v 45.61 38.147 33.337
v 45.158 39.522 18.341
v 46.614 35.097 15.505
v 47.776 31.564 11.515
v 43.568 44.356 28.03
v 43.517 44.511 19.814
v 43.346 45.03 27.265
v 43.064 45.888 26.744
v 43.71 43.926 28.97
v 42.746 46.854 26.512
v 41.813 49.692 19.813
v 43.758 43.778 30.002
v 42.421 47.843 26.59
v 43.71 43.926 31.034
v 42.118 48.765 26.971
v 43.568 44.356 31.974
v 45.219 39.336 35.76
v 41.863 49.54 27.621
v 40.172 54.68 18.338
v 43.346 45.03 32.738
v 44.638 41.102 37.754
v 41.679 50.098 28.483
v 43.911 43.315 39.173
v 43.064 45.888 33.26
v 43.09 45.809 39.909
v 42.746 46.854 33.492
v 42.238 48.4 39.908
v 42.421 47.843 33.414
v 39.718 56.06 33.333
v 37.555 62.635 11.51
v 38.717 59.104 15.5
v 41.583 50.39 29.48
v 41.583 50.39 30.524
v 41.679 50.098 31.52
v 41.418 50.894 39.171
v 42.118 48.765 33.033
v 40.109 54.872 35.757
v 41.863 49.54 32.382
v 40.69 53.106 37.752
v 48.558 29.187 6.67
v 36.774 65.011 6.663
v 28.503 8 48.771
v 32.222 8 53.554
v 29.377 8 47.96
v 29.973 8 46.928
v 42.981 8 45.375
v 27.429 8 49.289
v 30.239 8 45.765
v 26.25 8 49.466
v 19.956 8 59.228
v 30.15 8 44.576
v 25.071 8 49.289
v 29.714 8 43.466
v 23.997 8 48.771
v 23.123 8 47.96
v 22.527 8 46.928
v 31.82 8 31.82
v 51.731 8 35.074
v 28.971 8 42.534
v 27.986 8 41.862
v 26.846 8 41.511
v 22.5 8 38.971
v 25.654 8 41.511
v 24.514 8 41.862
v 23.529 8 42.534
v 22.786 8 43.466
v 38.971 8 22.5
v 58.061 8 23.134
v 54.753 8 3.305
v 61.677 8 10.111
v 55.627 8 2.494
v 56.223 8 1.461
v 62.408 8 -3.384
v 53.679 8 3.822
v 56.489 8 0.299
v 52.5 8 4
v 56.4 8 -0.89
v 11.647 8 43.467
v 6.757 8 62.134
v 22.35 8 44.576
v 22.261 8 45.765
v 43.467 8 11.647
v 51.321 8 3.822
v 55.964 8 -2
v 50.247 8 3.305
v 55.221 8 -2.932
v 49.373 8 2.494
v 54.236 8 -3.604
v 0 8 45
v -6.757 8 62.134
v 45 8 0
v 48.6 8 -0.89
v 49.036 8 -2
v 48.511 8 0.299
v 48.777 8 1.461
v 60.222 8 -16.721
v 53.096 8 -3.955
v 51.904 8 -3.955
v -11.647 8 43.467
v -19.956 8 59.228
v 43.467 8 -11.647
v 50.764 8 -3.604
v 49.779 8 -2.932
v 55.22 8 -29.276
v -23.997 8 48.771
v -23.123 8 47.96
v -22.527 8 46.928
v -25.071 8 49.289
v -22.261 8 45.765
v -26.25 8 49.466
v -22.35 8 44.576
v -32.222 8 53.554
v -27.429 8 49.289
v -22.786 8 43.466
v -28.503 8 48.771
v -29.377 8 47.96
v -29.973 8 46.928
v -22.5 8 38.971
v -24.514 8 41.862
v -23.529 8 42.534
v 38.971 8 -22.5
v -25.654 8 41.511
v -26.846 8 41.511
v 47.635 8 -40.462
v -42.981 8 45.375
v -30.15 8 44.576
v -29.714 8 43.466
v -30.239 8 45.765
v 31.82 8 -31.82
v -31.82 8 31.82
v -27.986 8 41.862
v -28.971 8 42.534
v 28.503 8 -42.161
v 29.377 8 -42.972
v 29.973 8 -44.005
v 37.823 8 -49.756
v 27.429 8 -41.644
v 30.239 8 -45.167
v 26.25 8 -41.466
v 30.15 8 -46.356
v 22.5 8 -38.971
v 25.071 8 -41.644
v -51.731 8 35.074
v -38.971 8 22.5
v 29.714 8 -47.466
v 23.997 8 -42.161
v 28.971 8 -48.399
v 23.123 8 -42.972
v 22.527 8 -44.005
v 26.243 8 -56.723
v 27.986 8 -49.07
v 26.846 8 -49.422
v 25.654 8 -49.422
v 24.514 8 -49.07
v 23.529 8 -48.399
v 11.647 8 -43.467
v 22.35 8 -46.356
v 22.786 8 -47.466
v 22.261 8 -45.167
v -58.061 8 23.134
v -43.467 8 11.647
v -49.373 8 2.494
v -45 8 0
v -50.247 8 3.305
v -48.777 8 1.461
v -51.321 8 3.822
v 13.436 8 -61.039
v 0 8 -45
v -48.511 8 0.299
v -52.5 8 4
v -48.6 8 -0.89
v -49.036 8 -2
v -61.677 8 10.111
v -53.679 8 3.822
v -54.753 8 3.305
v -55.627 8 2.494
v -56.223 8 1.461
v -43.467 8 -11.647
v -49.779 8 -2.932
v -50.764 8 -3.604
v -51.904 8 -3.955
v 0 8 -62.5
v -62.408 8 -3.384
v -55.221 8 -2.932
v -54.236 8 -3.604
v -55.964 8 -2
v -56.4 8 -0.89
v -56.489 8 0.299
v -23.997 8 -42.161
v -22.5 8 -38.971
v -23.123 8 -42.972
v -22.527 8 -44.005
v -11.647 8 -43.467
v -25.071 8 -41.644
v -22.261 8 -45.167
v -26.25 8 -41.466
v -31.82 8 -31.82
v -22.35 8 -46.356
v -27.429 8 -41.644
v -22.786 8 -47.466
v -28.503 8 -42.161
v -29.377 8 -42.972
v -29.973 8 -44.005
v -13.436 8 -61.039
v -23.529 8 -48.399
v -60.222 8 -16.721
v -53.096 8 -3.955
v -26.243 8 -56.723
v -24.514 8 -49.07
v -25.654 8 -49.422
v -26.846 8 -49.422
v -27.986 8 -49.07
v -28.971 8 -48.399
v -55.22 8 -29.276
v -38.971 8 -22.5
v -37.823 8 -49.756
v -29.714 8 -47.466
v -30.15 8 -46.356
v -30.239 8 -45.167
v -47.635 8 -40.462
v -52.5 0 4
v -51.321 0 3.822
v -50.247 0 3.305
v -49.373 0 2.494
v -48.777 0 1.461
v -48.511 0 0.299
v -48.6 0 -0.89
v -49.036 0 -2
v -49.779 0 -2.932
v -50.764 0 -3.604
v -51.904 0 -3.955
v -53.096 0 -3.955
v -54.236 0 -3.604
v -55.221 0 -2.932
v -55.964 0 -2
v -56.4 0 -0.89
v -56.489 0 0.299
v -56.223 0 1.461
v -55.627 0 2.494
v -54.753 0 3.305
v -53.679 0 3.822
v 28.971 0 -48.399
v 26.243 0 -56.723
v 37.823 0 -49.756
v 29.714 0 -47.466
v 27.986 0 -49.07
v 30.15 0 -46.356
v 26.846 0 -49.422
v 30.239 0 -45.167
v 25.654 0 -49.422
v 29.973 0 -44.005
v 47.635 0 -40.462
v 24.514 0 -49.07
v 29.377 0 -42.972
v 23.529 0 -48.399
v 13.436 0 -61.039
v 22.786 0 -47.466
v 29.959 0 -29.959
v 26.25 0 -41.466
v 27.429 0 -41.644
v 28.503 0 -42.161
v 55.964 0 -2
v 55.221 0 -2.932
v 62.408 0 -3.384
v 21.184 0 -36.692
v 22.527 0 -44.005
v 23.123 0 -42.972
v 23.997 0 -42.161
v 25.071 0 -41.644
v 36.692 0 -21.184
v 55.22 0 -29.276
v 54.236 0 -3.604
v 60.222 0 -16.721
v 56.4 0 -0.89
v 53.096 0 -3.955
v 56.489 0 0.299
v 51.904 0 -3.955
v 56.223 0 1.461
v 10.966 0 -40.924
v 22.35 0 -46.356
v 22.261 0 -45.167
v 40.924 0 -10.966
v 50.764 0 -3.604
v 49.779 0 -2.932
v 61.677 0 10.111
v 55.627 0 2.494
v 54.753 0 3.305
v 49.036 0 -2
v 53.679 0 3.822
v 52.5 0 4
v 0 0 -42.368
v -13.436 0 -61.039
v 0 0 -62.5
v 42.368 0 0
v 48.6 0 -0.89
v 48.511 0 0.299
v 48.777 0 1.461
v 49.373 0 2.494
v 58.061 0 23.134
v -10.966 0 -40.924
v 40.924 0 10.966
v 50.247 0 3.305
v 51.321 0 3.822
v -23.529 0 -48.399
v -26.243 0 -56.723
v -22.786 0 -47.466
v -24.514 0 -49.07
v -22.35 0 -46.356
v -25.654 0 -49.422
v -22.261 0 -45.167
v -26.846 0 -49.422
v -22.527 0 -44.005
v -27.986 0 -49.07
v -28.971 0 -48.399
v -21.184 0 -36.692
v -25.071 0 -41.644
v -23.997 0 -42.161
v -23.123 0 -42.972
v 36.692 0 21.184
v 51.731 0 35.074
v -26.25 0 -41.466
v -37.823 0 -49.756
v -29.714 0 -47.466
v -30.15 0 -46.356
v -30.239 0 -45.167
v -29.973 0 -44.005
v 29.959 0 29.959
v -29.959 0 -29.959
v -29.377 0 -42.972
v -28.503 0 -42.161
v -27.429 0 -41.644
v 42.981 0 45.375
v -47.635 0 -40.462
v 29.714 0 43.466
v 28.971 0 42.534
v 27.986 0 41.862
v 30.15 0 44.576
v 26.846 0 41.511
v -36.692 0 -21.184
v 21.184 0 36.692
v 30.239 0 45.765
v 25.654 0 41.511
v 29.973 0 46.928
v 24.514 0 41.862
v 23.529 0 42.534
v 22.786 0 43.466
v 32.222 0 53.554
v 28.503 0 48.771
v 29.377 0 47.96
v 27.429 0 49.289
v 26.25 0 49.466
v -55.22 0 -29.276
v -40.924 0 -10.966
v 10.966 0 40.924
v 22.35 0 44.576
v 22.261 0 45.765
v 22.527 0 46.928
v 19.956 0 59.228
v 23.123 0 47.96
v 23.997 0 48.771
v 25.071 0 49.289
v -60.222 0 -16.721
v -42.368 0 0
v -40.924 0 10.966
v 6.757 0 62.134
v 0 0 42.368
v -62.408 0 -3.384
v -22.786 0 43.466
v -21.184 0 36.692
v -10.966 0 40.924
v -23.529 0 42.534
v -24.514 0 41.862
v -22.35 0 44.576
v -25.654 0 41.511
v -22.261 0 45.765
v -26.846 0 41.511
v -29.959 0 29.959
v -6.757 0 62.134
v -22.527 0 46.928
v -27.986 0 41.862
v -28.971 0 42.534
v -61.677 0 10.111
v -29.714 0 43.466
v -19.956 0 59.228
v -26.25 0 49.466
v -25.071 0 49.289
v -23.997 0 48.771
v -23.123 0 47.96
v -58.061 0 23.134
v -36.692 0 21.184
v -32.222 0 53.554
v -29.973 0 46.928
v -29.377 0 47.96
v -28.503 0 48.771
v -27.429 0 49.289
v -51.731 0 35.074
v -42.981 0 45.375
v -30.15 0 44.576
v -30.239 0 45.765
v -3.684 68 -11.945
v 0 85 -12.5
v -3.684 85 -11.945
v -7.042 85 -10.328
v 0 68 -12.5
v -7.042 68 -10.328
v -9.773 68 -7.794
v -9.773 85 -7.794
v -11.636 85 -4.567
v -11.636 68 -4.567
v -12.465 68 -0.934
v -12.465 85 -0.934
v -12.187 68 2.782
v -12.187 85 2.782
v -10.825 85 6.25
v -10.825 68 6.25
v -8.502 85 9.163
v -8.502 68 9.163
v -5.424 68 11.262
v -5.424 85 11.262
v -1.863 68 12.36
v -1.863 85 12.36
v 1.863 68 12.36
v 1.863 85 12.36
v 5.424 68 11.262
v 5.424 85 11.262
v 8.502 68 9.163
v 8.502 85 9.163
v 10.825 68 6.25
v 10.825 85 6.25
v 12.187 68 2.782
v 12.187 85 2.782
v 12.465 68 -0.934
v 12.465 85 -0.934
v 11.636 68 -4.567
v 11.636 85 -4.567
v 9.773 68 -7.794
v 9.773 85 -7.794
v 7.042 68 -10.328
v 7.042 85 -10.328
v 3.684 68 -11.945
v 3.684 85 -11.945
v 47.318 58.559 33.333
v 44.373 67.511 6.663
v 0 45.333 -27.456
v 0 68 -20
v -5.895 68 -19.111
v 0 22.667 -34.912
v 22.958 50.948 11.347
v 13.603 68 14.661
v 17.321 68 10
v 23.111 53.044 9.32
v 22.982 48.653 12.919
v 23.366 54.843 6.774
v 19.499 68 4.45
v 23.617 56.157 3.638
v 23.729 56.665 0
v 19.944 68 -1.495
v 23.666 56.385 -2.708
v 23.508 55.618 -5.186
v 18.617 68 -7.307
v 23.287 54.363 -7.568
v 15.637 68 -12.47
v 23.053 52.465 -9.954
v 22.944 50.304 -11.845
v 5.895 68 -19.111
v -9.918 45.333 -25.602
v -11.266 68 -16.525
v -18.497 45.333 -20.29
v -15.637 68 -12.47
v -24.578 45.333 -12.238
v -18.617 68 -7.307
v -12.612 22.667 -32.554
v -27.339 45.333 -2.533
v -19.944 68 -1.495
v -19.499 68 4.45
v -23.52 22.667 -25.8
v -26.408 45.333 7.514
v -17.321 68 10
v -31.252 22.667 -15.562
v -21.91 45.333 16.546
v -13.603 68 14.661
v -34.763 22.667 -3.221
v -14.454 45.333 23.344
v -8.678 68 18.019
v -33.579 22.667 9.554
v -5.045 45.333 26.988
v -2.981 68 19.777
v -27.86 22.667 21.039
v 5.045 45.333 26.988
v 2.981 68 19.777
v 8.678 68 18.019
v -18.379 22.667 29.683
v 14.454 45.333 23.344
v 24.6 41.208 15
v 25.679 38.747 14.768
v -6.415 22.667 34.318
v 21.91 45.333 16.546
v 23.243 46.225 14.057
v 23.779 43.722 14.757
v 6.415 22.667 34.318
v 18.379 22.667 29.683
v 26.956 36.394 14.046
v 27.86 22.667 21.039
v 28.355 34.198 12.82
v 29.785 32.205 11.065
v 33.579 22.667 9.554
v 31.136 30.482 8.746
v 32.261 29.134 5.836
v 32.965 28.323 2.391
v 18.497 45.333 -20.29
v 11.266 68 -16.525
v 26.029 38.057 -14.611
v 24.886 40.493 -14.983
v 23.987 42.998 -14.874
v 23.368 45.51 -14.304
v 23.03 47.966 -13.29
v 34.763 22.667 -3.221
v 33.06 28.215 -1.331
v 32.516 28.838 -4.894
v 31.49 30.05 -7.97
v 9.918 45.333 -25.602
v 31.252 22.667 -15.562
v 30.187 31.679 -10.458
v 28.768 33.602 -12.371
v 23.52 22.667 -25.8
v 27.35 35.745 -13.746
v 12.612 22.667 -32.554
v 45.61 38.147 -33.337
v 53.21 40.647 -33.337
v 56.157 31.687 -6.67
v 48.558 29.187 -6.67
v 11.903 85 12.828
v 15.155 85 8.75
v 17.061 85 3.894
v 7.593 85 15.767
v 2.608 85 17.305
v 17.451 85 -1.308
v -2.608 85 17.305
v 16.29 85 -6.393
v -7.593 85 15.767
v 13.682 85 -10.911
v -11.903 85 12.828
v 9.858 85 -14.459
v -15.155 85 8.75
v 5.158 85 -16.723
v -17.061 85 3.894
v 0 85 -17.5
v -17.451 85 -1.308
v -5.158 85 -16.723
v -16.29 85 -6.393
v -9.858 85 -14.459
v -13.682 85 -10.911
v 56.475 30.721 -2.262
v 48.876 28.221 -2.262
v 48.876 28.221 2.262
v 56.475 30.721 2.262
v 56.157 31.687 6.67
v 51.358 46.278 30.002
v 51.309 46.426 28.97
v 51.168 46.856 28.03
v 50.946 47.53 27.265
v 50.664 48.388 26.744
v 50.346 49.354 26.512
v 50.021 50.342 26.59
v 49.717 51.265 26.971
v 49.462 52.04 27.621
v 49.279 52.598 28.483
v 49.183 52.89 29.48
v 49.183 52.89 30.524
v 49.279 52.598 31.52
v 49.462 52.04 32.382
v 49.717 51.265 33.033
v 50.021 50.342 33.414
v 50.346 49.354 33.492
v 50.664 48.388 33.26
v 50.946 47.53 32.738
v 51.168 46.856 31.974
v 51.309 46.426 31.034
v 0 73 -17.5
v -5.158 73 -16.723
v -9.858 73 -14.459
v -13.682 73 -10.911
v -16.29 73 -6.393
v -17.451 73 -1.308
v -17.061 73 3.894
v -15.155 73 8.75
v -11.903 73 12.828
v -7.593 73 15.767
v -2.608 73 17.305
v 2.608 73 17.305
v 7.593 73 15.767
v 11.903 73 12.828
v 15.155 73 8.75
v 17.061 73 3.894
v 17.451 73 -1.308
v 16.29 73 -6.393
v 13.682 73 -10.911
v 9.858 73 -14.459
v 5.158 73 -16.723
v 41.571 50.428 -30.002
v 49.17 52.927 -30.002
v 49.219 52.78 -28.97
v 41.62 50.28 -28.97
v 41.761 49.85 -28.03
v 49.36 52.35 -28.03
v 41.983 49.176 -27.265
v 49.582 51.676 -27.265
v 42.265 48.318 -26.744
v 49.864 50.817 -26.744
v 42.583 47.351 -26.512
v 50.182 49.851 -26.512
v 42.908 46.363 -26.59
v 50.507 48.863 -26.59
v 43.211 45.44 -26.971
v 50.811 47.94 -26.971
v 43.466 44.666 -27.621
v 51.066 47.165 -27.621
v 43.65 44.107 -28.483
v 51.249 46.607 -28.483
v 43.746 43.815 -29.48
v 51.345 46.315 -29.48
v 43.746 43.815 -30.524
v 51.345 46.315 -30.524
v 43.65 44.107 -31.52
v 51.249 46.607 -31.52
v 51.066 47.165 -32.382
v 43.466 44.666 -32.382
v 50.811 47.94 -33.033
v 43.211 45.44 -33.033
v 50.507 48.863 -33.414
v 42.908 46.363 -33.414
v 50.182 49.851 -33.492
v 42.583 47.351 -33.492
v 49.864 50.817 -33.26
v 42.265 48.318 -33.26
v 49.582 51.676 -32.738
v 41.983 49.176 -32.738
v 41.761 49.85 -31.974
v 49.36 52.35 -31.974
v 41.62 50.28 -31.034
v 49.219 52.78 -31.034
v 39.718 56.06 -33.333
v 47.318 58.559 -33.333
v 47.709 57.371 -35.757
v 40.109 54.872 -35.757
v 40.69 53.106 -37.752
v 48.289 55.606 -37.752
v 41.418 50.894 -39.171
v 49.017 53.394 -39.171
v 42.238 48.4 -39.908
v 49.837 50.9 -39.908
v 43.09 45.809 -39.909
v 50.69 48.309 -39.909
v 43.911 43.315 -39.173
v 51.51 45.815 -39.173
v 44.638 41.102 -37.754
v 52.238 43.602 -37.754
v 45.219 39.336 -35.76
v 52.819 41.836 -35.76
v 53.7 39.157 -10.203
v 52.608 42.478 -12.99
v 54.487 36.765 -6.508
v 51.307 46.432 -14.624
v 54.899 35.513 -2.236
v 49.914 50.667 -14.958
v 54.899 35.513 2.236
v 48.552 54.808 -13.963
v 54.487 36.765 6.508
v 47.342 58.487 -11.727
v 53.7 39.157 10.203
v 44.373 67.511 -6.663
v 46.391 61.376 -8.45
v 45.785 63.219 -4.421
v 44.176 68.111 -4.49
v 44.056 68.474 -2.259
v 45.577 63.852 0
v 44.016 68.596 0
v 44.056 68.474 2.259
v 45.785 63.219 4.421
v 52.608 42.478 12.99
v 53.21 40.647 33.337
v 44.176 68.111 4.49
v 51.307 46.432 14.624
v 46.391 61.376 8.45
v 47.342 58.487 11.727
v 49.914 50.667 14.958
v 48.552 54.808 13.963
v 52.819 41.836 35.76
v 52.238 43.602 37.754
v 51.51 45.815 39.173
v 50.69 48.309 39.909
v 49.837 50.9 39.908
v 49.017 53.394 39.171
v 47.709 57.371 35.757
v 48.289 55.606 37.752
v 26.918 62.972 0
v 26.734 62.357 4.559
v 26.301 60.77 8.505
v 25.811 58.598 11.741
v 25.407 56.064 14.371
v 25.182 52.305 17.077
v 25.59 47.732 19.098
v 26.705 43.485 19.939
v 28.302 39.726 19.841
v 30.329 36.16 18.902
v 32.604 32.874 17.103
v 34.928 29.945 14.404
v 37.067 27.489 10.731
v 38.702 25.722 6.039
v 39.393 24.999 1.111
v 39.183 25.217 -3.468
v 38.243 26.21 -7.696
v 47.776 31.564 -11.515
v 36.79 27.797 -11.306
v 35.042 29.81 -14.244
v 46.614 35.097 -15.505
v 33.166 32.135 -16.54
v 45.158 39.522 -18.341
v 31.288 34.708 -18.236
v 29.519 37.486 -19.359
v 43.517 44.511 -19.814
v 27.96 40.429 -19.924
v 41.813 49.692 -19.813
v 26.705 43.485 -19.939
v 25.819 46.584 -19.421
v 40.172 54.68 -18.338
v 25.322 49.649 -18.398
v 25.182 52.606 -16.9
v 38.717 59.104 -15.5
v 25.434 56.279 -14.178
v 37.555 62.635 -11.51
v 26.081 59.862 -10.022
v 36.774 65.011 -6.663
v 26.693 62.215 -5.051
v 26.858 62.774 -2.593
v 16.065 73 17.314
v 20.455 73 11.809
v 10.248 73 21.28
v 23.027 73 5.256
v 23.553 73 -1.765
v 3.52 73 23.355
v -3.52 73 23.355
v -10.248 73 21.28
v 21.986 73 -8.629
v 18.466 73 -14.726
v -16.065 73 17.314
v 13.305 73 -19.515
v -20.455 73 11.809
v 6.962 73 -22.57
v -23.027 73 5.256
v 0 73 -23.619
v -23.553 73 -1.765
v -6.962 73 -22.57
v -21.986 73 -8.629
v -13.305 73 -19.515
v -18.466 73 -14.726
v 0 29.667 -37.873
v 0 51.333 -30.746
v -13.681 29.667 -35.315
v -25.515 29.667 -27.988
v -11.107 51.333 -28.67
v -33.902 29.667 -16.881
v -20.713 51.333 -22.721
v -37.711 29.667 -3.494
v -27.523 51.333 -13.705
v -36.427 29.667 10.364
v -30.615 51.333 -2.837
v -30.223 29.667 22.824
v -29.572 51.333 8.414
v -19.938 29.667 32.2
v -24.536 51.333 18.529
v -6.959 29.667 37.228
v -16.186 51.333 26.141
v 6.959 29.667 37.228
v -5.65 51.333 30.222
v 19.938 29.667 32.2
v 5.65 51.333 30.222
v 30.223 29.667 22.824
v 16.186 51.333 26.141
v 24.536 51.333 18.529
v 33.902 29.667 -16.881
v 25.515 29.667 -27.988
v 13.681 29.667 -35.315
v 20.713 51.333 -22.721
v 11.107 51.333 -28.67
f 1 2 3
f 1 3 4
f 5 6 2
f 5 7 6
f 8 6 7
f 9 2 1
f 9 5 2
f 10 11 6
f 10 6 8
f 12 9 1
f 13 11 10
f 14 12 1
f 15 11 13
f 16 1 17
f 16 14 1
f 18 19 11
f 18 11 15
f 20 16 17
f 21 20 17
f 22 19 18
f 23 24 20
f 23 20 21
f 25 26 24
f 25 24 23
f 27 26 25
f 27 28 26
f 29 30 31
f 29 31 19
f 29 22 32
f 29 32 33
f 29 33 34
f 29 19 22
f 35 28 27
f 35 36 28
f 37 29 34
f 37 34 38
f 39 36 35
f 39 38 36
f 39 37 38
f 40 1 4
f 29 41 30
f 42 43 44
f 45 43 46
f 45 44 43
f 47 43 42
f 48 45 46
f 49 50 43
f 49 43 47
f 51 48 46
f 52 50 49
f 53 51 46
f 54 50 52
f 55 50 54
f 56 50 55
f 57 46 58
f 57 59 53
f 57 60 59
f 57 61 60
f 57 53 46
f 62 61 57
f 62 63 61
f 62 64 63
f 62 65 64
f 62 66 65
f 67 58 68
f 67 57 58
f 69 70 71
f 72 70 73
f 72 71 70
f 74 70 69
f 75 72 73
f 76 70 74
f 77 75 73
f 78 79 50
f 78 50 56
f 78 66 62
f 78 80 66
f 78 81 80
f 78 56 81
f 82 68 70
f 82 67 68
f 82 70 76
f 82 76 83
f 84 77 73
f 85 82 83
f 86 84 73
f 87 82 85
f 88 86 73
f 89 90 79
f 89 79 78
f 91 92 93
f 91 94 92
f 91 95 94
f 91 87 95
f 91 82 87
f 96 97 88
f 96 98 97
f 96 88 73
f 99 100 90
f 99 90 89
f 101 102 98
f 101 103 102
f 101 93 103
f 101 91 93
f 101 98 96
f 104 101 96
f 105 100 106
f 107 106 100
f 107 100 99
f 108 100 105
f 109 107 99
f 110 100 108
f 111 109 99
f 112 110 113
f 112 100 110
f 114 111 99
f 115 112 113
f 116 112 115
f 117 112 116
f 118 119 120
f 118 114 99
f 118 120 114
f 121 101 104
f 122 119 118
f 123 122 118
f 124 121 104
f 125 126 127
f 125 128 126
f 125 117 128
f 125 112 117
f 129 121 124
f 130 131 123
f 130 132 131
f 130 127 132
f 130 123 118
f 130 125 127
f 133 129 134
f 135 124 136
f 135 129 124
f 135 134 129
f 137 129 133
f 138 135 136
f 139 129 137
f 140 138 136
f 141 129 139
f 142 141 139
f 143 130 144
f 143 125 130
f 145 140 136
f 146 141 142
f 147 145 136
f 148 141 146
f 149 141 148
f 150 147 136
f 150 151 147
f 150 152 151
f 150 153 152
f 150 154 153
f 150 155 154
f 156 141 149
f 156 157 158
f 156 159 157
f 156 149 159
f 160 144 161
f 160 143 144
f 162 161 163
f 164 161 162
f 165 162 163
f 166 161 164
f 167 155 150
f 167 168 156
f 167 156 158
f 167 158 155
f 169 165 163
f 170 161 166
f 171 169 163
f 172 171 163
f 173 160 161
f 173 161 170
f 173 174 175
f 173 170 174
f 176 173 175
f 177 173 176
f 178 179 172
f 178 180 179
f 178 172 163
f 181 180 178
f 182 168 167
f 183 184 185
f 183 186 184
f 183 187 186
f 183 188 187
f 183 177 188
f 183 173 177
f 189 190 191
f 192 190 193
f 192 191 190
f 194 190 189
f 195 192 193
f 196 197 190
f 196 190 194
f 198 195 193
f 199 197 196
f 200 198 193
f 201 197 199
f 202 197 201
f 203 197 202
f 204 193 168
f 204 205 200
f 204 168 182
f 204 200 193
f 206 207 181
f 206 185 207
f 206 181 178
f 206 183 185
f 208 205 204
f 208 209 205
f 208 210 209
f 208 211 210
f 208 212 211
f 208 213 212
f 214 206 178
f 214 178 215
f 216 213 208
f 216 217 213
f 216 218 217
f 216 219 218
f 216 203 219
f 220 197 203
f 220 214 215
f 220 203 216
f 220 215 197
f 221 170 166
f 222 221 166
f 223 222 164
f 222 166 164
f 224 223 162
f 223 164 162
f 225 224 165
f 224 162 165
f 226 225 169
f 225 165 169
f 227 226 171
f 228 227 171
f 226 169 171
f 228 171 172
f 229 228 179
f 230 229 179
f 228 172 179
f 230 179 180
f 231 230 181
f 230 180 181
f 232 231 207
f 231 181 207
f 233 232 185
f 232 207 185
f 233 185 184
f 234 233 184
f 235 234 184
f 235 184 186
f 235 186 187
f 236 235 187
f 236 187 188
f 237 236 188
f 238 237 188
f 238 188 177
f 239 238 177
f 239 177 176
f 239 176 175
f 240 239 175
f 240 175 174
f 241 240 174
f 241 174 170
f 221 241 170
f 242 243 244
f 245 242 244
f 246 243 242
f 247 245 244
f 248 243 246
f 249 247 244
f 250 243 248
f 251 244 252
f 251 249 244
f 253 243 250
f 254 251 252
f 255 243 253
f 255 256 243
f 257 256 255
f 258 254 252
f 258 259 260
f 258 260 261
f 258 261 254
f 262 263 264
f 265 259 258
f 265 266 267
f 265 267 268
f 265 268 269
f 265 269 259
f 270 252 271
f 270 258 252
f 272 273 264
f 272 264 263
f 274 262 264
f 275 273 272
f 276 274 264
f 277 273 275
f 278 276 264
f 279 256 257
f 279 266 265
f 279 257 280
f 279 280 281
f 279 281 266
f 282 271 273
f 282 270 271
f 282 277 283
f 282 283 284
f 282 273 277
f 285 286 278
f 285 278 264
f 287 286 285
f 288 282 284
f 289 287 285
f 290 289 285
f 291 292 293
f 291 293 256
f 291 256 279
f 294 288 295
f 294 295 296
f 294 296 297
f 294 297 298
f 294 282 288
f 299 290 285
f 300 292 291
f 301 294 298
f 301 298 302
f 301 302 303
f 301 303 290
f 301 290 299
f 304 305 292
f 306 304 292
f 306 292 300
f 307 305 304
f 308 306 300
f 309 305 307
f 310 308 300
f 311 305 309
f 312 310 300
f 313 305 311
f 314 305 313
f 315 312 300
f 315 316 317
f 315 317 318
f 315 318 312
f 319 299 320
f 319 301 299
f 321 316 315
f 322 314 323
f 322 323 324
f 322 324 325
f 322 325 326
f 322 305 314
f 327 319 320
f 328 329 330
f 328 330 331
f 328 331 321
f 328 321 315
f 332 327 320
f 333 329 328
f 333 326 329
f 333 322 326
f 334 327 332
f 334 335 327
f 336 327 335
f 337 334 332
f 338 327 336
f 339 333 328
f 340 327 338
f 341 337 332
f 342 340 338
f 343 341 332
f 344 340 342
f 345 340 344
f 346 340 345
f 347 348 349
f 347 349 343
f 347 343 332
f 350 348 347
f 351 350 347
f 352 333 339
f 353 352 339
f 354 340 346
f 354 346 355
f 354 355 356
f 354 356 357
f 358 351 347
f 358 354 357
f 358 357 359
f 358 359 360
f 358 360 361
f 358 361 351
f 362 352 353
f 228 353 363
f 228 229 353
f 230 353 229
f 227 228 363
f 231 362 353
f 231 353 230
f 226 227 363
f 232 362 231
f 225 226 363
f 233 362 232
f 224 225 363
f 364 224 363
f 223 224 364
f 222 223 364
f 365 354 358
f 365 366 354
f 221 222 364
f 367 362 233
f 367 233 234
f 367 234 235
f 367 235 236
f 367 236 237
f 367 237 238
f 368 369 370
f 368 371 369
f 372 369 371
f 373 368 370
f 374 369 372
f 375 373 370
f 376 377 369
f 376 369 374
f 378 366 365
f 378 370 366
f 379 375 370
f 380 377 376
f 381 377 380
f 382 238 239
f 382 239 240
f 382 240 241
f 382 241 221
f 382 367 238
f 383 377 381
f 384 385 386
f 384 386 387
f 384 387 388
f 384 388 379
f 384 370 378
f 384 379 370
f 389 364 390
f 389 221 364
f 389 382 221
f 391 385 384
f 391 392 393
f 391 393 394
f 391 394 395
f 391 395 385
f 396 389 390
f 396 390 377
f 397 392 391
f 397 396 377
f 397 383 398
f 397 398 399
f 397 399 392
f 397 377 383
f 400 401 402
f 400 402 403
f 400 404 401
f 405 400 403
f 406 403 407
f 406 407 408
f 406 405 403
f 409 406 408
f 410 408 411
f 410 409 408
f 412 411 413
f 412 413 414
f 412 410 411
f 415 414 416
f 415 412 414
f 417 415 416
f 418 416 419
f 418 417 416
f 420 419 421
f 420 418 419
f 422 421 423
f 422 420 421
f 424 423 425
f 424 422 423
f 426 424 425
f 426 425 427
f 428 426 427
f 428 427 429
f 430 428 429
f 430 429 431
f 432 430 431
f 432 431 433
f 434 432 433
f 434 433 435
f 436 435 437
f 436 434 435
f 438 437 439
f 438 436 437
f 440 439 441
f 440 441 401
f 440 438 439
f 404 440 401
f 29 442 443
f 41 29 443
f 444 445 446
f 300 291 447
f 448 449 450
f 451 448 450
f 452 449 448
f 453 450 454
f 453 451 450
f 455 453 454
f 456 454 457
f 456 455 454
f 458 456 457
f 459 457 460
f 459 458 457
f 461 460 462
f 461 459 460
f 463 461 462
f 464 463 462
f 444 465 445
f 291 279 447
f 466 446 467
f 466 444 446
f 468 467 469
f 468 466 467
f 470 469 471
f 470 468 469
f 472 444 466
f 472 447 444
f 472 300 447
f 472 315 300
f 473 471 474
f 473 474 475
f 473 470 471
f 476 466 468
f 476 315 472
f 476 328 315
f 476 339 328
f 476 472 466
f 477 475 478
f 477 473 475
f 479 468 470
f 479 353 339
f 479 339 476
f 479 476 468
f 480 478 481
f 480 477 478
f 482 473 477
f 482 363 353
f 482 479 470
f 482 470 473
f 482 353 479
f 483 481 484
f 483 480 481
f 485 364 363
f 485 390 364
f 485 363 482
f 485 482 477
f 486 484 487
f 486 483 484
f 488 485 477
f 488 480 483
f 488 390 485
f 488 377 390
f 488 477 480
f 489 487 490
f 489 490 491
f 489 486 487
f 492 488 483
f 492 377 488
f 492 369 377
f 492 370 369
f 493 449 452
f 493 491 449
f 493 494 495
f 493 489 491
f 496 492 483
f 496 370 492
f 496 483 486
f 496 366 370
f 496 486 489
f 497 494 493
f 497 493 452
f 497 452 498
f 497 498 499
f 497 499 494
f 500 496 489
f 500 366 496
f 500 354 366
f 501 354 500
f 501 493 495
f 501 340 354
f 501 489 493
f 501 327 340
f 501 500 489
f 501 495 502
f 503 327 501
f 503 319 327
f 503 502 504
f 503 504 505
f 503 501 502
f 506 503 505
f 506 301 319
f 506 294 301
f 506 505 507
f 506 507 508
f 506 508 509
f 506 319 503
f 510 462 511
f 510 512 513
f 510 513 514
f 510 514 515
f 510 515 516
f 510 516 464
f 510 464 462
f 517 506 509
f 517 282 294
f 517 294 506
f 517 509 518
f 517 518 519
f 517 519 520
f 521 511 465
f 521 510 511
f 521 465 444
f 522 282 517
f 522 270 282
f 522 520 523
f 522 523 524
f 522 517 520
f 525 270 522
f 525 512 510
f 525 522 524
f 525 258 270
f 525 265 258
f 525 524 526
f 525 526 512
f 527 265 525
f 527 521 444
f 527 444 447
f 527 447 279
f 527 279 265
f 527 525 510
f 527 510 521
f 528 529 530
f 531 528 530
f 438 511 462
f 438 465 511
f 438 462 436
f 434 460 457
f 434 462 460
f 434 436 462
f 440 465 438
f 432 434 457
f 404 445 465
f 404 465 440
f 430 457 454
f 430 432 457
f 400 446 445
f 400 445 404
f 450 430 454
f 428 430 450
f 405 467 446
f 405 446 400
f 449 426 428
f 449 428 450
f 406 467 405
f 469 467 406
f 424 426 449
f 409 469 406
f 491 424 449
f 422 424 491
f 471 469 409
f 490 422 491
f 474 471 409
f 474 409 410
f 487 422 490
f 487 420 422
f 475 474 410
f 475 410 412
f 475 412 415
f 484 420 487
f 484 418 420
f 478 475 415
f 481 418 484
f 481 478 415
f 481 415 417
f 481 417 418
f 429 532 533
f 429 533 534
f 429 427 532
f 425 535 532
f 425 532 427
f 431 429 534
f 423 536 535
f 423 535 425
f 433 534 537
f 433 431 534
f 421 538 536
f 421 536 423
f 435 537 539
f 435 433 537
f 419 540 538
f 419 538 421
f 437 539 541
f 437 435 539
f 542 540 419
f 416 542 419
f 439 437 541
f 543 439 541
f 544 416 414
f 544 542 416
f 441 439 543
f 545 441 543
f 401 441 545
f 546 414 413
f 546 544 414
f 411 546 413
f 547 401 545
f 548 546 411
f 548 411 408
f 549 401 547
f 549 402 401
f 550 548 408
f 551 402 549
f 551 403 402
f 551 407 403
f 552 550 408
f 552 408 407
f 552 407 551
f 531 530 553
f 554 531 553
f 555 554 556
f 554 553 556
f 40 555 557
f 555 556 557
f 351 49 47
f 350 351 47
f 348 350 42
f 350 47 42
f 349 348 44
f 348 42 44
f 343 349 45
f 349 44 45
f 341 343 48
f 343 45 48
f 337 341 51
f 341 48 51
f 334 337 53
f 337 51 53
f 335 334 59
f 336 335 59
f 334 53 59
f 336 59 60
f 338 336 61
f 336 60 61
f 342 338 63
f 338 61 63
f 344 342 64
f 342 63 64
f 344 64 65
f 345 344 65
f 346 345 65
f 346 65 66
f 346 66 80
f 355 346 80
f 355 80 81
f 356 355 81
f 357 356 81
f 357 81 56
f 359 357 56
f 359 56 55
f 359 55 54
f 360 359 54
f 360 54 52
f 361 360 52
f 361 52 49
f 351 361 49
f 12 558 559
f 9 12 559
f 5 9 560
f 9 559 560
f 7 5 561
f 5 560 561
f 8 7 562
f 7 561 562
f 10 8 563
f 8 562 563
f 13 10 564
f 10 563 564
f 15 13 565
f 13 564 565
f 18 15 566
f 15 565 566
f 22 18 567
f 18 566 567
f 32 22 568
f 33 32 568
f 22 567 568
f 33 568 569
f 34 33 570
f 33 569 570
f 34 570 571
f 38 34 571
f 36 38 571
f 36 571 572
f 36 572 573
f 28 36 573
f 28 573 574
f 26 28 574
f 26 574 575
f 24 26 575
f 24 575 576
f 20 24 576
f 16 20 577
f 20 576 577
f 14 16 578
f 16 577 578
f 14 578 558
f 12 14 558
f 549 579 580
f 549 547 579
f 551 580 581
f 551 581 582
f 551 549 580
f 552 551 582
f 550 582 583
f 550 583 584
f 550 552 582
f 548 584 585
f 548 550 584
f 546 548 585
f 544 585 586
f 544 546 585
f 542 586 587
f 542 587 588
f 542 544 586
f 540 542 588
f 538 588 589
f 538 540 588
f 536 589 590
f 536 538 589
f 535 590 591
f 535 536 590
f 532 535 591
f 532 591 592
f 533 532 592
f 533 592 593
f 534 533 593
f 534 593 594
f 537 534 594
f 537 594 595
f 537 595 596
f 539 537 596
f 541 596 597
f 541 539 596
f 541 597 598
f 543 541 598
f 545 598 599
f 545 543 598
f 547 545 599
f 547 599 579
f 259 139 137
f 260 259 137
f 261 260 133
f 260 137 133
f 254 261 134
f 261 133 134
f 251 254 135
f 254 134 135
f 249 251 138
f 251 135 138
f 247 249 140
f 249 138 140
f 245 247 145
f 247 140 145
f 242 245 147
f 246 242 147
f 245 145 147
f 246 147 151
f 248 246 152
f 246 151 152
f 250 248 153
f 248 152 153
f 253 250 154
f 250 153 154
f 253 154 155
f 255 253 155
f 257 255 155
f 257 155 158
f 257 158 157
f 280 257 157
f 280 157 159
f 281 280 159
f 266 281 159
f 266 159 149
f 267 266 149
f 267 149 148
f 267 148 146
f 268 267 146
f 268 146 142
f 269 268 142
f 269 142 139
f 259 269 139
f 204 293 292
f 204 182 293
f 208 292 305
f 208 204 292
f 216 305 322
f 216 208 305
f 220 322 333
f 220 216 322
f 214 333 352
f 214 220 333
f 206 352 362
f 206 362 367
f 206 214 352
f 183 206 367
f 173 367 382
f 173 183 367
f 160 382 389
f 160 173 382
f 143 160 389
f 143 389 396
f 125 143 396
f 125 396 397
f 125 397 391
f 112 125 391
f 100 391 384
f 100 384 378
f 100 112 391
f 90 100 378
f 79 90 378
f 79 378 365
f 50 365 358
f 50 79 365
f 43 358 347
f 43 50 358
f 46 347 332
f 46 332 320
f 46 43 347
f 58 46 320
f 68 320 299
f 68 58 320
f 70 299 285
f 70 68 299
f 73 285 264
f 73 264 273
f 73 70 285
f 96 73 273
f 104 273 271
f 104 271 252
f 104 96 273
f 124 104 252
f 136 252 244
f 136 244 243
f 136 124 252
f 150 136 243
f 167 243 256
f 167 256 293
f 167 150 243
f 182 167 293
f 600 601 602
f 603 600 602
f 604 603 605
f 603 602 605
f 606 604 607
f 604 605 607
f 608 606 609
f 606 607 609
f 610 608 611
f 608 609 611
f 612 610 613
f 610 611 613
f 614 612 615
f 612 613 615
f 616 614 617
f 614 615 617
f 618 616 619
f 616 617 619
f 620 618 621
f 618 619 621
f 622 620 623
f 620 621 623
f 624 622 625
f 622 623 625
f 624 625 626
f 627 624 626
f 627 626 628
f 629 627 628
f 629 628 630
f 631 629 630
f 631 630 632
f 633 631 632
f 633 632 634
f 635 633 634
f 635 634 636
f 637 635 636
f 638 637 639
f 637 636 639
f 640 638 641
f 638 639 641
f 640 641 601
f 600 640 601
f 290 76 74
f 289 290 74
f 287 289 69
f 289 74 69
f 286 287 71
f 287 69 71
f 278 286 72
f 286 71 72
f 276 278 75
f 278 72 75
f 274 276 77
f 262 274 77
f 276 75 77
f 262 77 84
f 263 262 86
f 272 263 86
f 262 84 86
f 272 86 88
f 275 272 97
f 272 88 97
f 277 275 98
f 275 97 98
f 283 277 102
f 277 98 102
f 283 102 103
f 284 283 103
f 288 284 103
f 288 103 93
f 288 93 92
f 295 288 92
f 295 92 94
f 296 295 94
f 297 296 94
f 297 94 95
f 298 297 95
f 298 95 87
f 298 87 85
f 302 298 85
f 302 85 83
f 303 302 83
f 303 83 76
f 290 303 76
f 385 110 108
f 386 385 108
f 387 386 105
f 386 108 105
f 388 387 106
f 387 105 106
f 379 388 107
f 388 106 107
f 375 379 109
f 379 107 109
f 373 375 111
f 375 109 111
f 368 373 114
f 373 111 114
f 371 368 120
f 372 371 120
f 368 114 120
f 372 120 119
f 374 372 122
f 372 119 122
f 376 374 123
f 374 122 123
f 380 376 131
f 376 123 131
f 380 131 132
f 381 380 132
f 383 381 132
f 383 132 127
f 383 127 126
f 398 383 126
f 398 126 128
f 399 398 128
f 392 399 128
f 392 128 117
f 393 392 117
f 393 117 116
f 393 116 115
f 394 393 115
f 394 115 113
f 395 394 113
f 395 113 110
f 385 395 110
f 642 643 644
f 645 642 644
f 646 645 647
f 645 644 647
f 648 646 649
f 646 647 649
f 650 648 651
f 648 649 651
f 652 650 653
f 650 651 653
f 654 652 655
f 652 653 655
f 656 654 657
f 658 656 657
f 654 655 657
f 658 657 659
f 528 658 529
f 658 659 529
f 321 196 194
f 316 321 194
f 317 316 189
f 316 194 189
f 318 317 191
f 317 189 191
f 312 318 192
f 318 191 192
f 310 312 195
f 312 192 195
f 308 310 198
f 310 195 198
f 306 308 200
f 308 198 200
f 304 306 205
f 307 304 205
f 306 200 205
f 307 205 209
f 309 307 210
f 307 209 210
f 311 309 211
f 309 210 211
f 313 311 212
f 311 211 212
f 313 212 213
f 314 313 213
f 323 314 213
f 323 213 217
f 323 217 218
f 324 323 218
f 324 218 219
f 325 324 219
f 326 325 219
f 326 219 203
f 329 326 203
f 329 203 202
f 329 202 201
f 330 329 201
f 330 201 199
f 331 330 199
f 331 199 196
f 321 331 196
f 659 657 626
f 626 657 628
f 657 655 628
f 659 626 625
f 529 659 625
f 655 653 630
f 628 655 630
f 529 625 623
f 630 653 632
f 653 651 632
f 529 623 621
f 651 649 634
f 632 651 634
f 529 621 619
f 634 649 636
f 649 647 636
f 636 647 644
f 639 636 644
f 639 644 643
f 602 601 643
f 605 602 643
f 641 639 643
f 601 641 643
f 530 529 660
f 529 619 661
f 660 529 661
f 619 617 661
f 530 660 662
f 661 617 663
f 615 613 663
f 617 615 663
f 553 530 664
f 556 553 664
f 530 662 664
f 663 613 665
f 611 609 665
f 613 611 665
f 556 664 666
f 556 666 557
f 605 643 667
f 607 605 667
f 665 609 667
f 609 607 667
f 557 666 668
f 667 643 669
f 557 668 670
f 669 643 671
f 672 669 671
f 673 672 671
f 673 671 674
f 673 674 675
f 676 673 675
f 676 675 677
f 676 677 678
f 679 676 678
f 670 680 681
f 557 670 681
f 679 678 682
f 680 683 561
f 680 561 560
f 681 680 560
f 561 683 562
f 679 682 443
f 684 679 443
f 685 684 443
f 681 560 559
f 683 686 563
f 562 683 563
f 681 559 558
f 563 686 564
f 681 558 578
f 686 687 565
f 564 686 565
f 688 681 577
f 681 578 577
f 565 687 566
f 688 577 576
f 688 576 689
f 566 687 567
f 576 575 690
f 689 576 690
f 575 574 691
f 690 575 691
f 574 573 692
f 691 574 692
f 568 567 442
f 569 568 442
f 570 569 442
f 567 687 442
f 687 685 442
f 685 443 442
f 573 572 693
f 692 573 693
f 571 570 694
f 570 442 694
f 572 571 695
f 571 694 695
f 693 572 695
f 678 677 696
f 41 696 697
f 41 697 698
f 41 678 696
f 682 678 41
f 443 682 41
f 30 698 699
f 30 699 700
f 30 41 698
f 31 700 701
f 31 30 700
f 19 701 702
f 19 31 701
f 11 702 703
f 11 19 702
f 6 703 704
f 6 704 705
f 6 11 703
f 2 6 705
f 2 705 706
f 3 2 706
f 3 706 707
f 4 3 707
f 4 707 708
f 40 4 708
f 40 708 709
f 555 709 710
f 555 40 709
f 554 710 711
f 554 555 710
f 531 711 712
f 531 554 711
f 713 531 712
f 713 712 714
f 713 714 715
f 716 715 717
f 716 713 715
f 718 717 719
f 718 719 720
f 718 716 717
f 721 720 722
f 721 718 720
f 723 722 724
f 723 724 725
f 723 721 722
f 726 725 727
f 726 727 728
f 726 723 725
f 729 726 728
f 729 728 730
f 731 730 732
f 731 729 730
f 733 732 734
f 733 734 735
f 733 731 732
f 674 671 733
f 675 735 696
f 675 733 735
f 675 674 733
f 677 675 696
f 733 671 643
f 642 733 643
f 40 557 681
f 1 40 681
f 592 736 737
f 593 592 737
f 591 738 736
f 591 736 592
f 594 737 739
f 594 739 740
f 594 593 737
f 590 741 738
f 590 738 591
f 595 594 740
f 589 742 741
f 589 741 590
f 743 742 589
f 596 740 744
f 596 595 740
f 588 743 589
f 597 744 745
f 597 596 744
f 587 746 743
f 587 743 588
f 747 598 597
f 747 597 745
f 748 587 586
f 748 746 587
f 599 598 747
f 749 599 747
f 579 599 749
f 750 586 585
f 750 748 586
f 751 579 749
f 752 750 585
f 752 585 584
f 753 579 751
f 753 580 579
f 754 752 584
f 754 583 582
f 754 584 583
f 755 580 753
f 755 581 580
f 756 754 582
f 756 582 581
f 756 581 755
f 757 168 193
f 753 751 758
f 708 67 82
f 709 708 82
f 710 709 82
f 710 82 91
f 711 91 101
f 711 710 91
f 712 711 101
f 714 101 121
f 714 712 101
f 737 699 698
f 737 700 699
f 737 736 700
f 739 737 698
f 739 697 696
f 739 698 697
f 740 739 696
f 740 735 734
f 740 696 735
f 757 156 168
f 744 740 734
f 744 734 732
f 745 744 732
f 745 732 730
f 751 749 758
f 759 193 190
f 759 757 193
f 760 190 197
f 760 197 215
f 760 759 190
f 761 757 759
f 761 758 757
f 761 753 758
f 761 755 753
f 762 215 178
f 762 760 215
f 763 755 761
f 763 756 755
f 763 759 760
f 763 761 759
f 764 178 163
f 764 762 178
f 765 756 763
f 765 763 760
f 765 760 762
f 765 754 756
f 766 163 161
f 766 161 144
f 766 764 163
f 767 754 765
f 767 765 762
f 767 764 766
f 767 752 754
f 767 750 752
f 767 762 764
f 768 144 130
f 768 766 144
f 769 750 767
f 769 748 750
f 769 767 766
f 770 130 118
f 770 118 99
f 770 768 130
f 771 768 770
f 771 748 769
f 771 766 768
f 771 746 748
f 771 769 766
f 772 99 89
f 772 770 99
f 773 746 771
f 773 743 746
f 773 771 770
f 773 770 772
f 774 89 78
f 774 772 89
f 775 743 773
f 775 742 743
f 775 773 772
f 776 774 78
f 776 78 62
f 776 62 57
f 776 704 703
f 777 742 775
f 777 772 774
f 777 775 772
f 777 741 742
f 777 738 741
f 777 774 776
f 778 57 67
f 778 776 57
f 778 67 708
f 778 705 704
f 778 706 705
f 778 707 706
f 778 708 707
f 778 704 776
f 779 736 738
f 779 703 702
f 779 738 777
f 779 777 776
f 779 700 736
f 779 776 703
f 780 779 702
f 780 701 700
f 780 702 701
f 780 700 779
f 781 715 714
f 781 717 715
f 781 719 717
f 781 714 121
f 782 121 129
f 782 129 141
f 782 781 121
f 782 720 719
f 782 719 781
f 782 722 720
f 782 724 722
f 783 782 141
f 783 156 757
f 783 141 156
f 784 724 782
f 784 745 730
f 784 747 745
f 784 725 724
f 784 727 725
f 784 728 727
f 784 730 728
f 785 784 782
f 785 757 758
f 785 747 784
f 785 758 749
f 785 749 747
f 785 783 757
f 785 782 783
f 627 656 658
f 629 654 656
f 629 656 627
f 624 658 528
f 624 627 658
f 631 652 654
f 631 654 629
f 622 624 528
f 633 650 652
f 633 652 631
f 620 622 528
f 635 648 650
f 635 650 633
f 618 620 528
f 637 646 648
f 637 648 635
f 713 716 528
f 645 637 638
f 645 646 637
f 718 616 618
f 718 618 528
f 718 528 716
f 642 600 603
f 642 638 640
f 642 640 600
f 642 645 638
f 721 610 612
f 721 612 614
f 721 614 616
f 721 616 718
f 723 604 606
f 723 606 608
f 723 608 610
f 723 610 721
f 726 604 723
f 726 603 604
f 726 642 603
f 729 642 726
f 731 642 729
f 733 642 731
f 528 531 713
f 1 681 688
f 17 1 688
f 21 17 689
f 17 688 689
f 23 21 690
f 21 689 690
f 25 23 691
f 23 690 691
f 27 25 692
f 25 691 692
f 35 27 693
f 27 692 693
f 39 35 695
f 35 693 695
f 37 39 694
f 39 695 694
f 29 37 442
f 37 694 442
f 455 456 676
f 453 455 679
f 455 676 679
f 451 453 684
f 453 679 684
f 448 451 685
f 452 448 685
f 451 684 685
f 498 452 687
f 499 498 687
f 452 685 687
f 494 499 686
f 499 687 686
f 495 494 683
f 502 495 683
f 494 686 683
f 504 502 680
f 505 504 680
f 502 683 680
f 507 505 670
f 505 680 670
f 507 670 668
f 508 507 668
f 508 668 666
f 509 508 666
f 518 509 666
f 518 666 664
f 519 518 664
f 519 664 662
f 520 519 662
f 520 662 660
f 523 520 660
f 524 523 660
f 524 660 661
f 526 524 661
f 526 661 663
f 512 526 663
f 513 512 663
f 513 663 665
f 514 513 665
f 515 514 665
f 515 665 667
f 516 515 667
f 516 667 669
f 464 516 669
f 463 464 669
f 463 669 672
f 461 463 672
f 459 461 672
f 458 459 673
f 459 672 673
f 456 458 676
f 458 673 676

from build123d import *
from build123d.topology import SkipClean

# Parameters (mm, degrees)
SKETCH_11_R         = 4
CUT_EXTRUDE_1_DEPTH = 10
EXTRUDE_1_REACH     = 140.176
SKETCH_13_R         = 20
SKETCH_16_R         = 3.5
EXTRUDE_4_DEPTH     = 8
CUT_EXTRUDE_2_REACH = 140.176
SKETCH_17_R         = 15


with BuildPart() as part:
    # 草图1 → 旋转5 (revolve)
    with BuildSketch(Plane.XY, mode=Mode.PRIVATE) as revolve_5_sk:
        Polygon((42.367967, 0), (62.5, 0), (62.5, 8), (45, 8), (23.618855, 73), (17.5, 73), (17.5, 85), (12.5, 85), (12.5, 68), (20, 68), align=None)
    revolve(revolve_5_sk.sketch.rotate(Axis((0, 0, 0), (0, 1, 0)), 90), axis=Axis((0, 0, 0), (0, 1, 0)))

    # 草图11 → 切除-拉伸1 (cut)
    with BuildSketch(Plane(origin=(0, 8, 0), x_dir=(1, 0, 0), z_dir=(0, 1, 0))):
        with Locations(Location((52.5, 0, 0), (0, 0, 270))):
            Circle(SKETCH_11_R)
        with Locations(Location((26.25, -45.466334, 0), (0, 0, 270))):
            Circle(SKETCH_11_R)
        with Locations(Location((-26.25, -45.466334, 0), (0, 0, 270))):
            Circle(SKETCH_11_R)
        with Locations(Location((-52.5, 0, 0), (0, 0, 270))):
            Circle(SKETCH_11_R)
        with Locations(Location((-26.25, 45.466334, 0), (0, 0, 270))):
            Circle(SKETCH_11_R)
        with Locations(Location((26.25, 45.466334, 0), (0, 0, 270))):
            Circle(SKETCH_11_R)
    extrude(amount=-CUT_EXTRUDE_1_DEPTH, mode=Mode.SUBTRACT)

    # 草图13 → 凸台-拉伸1 (add, up to next)
    with BuildSketch(Plane(origin=(50.133302, 50, 0), x_dir=(0, 0, -1), z_dir=(0.9499276731466783, 0.3124698638111166, 0)), mode=Mode.PRIVATE) as extrude_1_sk1:
        with Locations(Location((0, -0.423678, 0), (0, 0, 90))):
            Circle(SKETCH_13_R)
    extrude_1_tool1 = extrude(extrude_1_sk1.sketch, amount=-EXTRUDE_1_REACH, mode=Mode.PRIVATE) - part.part
    add(extrude_1_tool1.solids().sort_by_distance((50.265689, 49.597537, 0))[0])

    # 草图16 → 凸台-拉伸4 (add)
    with SkipClean():  # the faces are left unmerged after this step: merging them gives an invalid solid
        with BuildSketch(Plane(origin=(50.133302, 50, 0), x_dir=(0, 0, -1), z_dir=(0.9499276731466783, 0.3124698638111166, 0))):
            with BuildLine():
                Line((-33.333333, 9.010442), (-6.662877, 18.433842))
                ThreePointArc((-6.662877, 18.433842), (0, 19.576322), (6.662877, 18.433842))
                Line((6.662877, 18.433842), (33.333333, 9.010442))
                ThreePointArc((33.333333, 9.010442), (40.001895, -0.416533), (33.336702, -9.845889))
                Line((33.336702, -9.845889), (6.669613, -19.278817))
                ThreePointArc((6.669613, -19.278817), (0, -20.423678), (-6.669613, -19.278817))
                Line((-6.669613, -19.278817), (-33.336702, -9.845889))
                ThreePointArc((-33.336702, -9.845889), (-40.001895, -0.416533), (-33.333333, 9.010442))
            make_face()
            with Locations(Location((30.001895, -0.418319, 0), (0, 0, 90))):
                Circle(SKETCH_16_R, mode=Mode.SUBTRACT)
            with Locations(Location((-30.001895, -0.418319, 0), (0, 0, 270))):
                Circle(SKETCH_16_R, mode=Mode.SUBTRACT)
        extrude(amount=-EXTRUDE_4_DEPTH)

    # 草图17 → 切除-拉伸2 (cut, up to next)
    with BuildSketch(Plane(origin=(50.133302, 50, 0), x_dir=(0, 0, -1), z_dir=(0.9499276731466783, 0.3124698638111166, 0)), mode=Mode.PRIVATE) as cut_extrude_2_sk1:
        with Locations(Location((0, -0.418319, 0), (0, 0, 90))):
            Circle(SKETCH_17_R)
    cut_extrude_2_tool1 = extrude(cut_extrude_2_sk1.sketch, amount=-CUT_EXTRUDE_2_REACH, mode=Mode.PRIVATE) & part.part
    add(cut_extrude_2_tool1.solids().sort_by_distance((50.264014, 49.602627, 0))[0], mode=Mode.SUBTRACT)


solid = part.part
